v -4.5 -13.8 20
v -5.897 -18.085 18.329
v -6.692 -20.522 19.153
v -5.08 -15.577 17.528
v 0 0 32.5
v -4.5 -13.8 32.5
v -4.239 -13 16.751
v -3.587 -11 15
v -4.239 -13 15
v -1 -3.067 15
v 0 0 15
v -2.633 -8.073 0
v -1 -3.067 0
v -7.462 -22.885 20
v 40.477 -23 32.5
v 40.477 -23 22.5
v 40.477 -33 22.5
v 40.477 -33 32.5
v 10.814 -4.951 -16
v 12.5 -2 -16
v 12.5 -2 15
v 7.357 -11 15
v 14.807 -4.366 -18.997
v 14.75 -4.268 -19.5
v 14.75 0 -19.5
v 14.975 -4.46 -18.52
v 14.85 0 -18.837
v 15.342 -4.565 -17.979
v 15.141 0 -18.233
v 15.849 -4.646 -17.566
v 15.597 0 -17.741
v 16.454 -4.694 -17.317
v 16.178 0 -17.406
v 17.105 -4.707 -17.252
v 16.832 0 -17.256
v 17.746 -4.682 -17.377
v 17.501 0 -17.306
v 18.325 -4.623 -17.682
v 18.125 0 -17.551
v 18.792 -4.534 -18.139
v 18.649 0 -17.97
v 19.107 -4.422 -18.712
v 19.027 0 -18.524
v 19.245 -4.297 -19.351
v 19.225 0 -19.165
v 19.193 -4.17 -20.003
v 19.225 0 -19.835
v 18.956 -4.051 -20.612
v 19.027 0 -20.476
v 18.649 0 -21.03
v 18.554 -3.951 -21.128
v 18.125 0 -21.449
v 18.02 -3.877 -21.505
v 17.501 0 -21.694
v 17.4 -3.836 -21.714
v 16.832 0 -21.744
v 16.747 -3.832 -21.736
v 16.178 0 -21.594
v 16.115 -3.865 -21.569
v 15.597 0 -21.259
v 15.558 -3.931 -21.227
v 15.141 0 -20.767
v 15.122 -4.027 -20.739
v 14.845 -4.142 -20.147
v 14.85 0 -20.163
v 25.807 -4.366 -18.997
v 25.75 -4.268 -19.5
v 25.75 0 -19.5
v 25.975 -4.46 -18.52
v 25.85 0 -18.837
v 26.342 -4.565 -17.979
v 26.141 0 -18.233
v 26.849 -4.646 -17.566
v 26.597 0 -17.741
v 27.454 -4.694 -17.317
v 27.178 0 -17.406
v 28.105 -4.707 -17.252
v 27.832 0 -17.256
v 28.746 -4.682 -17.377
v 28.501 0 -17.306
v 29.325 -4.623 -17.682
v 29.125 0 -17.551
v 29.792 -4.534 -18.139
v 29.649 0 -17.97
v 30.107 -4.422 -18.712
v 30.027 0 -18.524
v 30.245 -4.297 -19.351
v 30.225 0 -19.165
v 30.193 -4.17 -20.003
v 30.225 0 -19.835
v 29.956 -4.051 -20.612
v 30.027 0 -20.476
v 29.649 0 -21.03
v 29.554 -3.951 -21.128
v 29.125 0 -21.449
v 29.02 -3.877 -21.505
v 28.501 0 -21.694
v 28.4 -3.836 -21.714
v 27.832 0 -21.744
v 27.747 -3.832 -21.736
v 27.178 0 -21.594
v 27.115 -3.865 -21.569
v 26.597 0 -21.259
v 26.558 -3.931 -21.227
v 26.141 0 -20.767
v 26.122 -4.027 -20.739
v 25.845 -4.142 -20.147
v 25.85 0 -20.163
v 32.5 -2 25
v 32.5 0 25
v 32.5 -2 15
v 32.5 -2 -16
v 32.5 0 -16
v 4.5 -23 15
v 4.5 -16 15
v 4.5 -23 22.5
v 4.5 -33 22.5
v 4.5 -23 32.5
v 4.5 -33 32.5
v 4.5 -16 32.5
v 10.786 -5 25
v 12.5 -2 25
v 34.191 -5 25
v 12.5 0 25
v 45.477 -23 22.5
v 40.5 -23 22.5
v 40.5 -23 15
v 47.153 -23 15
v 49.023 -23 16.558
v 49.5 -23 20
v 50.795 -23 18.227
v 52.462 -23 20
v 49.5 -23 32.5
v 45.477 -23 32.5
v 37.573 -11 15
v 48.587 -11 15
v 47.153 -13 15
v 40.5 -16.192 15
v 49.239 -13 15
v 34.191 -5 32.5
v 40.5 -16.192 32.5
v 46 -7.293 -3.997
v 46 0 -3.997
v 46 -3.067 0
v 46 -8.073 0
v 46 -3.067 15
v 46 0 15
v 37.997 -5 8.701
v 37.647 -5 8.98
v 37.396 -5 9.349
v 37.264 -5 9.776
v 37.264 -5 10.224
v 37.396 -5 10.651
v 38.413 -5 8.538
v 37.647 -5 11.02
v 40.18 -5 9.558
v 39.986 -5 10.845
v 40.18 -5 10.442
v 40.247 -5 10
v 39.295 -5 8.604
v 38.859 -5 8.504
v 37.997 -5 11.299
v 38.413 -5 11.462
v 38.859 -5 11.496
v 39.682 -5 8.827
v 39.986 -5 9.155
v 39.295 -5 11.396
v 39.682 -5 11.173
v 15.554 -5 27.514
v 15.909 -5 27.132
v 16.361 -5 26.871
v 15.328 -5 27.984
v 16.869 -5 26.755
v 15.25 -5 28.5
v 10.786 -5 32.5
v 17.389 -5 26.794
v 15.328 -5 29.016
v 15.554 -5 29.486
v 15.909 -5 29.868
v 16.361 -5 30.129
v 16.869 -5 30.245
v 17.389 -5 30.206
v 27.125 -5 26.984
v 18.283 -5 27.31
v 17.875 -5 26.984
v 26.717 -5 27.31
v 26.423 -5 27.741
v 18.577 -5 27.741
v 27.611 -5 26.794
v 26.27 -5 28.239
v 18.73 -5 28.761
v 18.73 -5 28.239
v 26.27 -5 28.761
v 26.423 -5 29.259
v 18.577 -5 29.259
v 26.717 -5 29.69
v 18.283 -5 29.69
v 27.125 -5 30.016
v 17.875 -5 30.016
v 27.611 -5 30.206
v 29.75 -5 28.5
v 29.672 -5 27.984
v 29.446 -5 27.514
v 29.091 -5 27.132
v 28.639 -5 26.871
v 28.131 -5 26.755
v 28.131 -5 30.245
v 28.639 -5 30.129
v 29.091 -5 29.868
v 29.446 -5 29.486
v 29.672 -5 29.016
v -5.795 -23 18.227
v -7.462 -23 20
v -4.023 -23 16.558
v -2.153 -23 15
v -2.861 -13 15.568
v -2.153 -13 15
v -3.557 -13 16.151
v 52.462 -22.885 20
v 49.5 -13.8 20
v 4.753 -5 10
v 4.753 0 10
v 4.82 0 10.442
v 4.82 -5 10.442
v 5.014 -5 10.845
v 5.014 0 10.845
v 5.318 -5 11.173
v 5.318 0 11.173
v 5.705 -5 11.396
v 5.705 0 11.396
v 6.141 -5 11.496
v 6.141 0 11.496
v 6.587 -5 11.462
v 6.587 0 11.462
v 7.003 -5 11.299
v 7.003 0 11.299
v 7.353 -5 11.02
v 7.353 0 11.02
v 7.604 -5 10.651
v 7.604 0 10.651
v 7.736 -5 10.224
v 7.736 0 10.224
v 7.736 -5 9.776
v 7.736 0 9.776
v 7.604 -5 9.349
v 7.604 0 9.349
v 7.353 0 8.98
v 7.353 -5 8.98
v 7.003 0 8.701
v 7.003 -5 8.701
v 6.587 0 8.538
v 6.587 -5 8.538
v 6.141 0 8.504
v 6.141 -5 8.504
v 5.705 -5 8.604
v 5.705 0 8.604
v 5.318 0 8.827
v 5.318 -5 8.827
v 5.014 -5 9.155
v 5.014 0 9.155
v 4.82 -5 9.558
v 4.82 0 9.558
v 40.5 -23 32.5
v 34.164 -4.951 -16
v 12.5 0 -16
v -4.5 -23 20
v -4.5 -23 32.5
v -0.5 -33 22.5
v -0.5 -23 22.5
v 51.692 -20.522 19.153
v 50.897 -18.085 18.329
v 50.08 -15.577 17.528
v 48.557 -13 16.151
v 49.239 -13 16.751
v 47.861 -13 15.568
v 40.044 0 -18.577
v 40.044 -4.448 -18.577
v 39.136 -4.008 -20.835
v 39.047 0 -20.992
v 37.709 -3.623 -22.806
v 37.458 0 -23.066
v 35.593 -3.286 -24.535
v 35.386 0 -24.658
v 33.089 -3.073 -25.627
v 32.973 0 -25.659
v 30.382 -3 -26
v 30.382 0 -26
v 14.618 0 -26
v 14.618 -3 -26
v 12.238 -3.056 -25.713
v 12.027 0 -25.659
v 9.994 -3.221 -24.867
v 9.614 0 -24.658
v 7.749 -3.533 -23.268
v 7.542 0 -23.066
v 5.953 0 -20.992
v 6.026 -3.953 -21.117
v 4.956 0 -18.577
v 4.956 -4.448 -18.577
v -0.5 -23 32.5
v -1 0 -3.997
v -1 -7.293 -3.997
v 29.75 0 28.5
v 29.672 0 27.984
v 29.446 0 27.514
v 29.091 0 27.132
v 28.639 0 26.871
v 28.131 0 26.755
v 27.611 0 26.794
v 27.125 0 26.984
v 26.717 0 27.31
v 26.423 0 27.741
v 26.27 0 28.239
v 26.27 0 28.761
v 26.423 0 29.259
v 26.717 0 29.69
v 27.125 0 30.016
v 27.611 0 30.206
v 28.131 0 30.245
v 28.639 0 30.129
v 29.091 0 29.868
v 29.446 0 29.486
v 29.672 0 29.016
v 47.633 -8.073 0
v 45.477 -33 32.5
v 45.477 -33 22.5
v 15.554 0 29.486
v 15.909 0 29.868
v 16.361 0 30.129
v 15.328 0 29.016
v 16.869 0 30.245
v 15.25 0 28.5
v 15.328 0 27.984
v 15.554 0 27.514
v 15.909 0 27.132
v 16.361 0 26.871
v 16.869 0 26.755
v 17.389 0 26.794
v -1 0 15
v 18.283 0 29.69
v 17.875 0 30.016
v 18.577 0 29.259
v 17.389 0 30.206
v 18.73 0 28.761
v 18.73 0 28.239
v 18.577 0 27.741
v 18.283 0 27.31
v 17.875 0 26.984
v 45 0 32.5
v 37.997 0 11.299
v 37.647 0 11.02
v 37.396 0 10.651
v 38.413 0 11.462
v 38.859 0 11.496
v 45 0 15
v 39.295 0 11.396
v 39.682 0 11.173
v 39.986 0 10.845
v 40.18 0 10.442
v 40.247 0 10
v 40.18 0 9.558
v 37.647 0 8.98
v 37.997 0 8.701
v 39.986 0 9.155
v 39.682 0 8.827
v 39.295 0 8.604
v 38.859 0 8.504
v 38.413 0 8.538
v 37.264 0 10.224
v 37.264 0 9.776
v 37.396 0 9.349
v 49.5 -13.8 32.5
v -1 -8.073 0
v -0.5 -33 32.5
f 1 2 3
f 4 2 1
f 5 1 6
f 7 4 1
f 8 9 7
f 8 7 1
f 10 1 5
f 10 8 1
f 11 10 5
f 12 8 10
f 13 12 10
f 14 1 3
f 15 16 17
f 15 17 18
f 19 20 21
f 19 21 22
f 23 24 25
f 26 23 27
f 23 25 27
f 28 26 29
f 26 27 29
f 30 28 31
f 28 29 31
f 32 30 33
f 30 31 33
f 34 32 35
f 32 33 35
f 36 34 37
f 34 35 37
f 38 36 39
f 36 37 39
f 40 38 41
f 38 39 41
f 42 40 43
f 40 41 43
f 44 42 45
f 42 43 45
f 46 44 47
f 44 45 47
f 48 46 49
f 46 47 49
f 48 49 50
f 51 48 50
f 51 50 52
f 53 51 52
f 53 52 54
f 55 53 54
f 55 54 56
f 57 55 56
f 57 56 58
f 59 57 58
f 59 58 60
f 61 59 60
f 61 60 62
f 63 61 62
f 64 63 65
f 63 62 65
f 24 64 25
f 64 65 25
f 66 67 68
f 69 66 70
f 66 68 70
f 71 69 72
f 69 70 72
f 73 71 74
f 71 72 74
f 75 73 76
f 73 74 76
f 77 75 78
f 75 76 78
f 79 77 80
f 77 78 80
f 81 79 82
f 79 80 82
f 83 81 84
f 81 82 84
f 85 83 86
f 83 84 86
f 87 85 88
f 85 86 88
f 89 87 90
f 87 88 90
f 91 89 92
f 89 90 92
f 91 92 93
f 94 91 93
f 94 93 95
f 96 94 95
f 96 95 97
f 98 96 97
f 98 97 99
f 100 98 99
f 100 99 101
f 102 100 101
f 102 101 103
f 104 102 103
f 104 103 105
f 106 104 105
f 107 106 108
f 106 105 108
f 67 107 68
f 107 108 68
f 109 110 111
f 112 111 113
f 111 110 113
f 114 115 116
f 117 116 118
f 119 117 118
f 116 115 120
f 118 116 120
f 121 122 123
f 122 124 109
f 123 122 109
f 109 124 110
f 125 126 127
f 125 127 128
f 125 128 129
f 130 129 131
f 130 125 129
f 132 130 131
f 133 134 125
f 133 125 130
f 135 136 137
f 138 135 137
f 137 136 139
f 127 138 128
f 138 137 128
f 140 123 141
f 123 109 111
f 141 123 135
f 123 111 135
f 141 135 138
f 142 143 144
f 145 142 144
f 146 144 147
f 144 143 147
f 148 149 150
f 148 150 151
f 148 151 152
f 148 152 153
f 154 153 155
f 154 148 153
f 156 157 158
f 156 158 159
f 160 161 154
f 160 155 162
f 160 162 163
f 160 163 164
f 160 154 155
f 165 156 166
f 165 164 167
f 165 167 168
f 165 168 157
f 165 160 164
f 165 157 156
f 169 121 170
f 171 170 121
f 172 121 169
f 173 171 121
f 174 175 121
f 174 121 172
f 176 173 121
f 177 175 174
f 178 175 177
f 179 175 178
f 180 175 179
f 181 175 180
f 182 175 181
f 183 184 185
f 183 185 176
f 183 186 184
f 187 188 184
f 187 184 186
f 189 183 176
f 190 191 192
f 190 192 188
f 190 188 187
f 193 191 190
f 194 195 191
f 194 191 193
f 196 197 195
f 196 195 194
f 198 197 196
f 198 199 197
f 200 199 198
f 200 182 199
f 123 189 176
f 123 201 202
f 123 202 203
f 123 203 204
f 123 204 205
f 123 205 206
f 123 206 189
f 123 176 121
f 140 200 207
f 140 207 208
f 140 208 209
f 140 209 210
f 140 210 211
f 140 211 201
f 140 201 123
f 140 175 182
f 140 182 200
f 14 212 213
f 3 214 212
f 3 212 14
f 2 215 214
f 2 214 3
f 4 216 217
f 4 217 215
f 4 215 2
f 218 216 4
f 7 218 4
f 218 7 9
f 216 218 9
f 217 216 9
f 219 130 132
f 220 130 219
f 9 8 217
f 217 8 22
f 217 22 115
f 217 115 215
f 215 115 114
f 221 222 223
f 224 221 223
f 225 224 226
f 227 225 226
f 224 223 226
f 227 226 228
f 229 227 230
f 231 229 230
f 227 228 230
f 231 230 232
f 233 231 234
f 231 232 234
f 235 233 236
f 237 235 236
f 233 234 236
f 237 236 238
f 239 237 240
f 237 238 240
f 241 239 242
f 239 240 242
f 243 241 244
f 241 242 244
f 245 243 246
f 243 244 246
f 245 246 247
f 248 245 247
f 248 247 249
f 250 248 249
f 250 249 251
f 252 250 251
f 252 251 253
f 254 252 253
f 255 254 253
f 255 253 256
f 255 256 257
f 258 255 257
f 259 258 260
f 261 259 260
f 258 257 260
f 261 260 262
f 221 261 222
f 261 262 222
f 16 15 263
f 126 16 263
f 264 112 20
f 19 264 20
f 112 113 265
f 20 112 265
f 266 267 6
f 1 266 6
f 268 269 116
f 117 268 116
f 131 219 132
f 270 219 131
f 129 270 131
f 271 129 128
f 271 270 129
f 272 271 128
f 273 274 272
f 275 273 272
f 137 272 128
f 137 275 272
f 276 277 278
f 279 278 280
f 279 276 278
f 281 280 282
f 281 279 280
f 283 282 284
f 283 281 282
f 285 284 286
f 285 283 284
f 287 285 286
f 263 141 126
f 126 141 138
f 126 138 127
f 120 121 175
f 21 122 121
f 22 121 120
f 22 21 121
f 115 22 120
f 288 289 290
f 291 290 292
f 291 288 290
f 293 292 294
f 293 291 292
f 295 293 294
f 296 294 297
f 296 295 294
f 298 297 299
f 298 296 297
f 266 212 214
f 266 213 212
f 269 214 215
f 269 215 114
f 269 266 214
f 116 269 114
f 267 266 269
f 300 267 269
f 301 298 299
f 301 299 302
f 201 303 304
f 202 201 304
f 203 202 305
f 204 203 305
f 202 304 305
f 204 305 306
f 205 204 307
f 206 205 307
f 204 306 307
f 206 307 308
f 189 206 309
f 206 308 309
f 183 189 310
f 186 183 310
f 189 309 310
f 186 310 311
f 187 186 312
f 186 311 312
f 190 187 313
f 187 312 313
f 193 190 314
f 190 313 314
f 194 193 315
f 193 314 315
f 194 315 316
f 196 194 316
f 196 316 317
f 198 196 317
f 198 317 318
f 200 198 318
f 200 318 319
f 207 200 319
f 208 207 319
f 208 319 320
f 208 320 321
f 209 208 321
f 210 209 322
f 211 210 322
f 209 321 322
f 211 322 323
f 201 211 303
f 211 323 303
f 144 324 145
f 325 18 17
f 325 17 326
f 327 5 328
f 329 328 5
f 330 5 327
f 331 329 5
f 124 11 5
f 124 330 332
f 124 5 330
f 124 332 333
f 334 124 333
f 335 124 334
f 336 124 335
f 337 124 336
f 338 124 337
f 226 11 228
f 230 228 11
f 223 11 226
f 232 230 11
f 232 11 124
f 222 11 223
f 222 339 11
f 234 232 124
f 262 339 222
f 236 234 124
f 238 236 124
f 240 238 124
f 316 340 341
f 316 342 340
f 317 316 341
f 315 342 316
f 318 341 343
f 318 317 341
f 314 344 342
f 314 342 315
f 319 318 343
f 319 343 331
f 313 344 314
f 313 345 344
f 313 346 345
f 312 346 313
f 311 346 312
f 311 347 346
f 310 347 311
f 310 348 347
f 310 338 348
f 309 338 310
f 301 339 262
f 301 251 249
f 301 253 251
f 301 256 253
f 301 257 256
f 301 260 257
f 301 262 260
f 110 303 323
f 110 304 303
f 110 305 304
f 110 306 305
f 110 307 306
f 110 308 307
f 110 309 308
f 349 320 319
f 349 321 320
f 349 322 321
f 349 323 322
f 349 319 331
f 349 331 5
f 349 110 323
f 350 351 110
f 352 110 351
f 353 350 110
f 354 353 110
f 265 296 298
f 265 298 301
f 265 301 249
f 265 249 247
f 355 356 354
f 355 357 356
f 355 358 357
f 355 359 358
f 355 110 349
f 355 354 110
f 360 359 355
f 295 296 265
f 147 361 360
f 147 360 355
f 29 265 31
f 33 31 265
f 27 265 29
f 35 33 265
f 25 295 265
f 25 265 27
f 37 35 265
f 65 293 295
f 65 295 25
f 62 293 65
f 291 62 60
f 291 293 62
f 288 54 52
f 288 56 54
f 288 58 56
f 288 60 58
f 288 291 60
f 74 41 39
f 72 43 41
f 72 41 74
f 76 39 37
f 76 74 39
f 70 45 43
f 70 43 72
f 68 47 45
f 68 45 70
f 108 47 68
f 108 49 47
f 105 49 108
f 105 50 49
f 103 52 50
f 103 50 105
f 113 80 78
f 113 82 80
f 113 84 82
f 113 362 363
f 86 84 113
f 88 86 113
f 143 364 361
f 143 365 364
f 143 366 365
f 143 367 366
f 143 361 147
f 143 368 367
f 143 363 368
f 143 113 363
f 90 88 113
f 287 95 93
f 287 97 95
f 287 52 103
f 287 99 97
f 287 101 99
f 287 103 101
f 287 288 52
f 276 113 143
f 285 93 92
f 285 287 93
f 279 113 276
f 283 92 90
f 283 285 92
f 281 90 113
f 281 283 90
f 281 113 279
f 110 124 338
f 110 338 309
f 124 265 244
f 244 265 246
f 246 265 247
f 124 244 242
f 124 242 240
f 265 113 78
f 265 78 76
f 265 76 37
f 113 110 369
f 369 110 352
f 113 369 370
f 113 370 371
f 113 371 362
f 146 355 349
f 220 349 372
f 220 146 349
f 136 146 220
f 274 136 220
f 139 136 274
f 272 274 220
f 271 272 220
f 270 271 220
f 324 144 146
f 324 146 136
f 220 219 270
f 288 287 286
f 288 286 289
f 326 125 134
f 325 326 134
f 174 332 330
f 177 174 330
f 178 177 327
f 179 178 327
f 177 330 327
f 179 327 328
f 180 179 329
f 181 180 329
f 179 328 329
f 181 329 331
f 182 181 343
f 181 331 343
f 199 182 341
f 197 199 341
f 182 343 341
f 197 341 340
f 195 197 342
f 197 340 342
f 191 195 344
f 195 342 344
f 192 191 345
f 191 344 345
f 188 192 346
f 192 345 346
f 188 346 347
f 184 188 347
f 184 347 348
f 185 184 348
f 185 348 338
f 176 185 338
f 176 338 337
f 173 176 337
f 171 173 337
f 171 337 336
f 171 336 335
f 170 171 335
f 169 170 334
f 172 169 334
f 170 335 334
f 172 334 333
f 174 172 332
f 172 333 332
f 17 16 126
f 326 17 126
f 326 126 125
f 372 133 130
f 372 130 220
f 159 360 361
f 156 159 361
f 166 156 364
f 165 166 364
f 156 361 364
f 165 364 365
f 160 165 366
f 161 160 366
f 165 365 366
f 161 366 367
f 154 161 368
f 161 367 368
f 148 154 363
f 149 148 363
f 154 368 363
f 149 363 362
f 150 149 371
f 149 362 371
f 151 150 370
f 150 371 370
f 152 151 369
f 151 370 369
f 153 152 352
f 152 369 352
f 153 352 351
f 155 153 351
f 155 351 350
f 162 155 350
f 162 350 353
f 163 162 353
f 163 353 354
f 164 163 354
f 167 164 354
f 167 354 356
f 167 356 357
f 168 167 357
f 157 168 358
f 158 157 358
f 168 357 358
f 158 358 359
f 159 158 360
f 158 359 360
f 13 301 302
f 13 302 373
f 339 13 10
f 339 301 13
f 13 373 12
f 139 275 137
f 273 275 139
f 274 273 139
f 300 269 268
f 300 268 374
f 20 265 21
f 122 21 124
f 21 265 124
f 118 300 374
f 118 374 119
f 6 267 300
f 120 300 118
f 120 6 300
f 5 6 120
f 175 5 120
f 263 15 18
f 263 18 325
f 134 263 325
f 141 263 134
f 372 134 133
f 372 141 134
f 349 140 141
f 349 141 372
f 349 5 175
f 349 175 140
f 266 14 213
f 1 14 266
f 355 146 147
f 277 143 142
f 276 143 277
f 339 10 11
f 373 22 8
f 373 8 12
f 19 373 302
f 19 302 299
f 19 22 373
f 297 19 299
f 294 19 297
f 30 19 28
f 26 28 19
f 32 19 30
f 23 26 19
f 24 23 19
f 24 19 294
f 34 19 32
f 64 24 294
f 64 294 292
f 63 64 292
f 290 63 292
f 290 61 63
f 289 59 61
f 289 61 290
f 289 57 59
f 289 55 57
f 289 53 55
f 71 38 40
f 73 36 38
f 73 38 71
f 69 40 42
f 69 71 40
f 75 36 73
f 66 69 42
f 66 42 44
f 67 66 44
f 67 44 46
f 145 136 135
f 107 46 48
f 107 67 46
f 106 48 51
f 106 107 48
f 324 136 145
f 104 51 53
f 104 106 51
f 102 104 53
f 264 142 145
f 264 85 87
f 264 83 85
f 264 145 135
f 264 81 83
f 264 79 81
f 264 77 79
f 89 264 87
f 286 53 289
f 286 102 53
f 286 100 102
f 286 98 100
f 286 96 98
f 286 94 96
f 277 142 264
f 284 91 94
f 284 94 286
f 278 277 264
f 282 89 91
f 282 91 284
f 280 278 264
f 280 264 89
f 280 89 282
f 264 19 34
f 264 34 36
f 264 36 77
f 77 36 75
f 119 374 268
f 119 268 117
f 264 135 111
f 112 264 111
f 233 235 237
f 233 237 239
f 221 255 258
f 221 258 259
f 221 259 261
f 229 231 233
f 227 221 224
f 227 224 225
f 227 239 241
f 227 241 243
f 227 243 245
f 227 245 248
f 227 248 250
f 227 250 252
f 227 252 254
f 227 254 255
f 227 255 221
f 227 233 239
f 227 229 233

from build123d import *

# Parameters (mm, degrees)
SALIENTE_EXTRUIR1_DEPTH  = 35
CROQUIS6_R               = 2.25
CROQUIS6_W               = 20
CROQUIS6_H               = 25
CORTAR_EXTRUIR3_DEPTH    = 10
CROQUIS7_R               = 2.25
SALIENTE_EXTRUIR4_DEPTH  = 15
CORTAR_EXTRUIR8_DEPTH    = 50
CORTAR_EXTRUIR11_REACH   = 69.158
CORTAR_EXTRUIR12_DEPTH   = 16
CROQUIS13_W              = 6.081292266
CROQUIS13_H              = 9.753773429
CORTAR_EXTRUIR13_DEPTH   = 15
CORTAR_EXTRUIR14_DEPTH   = 63.5
CORTAR_EXTRUIR15_DEPTH   = 100
SALIENTE_EXTRUIR5_REACH  = 69.158
CROQUIS16_W              = 15
CROQUIS16_H              = 10
CORTAR_EXTRUIR16_DEPTH   = 200
CORTAR_EXTRUIR17_DEPTH   = 200
SALIENTE_EXTRUIR7_DEPTH  = 23.5
CROQUIS22_R              = 2.25
CORTAR_EXTRUIR19_DEPTH   = 47
CORTAR_EXTRUIR20_DEPTH   = 31
CROQUIS24_W              = 29.420485752
CROQUIS24_H              = 5
SALIENTE_EXTRUIR9_DEPTH  = 10
CROQUIS25_R              = 1.75
CROQUIS25_R_2            = 1.5
CORTAR_EXTRUIR21_DEPTH   = 5
CROQUIS26_W              = 58.407198467
CROQUIS26_H              = 13.689988589
CORTAR_EXTRUIR22_DEPTH   = 73.871462178
CROQUIS27_W              = 5
CROQUIS27_H              = 10
SALIENTE_EXTRUIR10_DEPTH = 10
CORTAR_EXTRUIR23_START   = -10
CORTAR_EXTRUIR23_DEPTH   = 10


# Read off the part's stored shape, not the designer's step: Cortar-Extruir23
with BuildPart() as part:
    # Croquis1 → Saliente-Extruir1 (new body)
    with BuildSketch(Plane.XY):
        Polygon((0, 0), (45, 0), (52.5, -23), (40.5, -23), (40.5, -16.192411456), (32.5, -2), (12.5, -2), (4.5, -16), (4.5, -23), (-7.5, -23), align=None)
    extrude(amount=SALIENTE_EXTRUIR1_DEPTH)

    # Croquis6 → Cortar-Extruir3 (cut)
    with BuildSketch(Plane(origin=(0, 0, 0), x_dir=(1, 0, 0), z_dir=(0, 1, 0))):
        with Locations(Location((17, -28.5, 0), (0, 0, 180))):
            Circle(CROQUIS6_R)
        with Locations(Location((28, -28.5, 0), (0, 0, 270))):
            Circle(CROQUIS6_R)
        with Locations((22.5, -12.5)):
            Rectangle(CROQUIS6_W, CROQUIS6_H)
    extrude(amount=-CORTAR_EXTRUIR3_DEPTH, mode=Mode.SUBTRACT)

    # Cortar-Extruir11: up to this plane
    cortar_extruir11_end = Plane(origin=(50, -15, 0), z_dir=(0, -0.9079593845004518, -0.41905817746174695))
    # Croquis11 → Cortar-Extruir11 (cut, up to the surface)
    with BuildSketch(Plane.XZ.offset(23), mode=Mode.PRIVATE) as cortar_extruir11_sk1:
        with BuildLine():
            Line((-7.5, 15), (-7.5, -3.030649644))
            Line((-7.5, -3.030649644), (52.5, -3.030649644))
            Line((52.5, -3.030649644), (52.5, 15))
            ThreePointArc((52.5, 15), (22.5, 5.553378231), (-7.5, 15))
        make_face()
    cortar_extruir11_tool1 = split(extrude(cortar_extruir11_sk1.sketch, amount=-CORTAR_EXTRUIR11_REACH, mode=Mode.PRIVATE), bisect_by=cortar_extruir11_end, keep=Keep.BOTH, mode=Mode.PRIVATE)
    add(cortar_extruir11_tool1.solids().sort_by_distance((22.5, -23, 3.105508))[0], mode=Mode.SUBTRACT)

    # Croquis13 → Cortar-Extruir13 (cut)
    with BuildSketch(Plane.XY.offset(35)):
        with Locations((-7.540646133, -18.123113286)):
            Rectangle(CROQUIS13_W, CROQUIS13_H)
        with Locations((52.540646133, -18.123113286)):
            Rectangle(CROQUIS13_W, CROQUIS13_H)
    extrude(amount=-CORTAR_EXTRUIR13_DEPTH, mode=Mode.SUBTRACT)

    # Croquis14 → Cortar-Extruir14 (cut, symmetric)
    with BuildSketch(Plane(origin=(0, 0, 0), x_dir=(0, 0, -1), z_dir=(1, 0, 0))):
        Polygon((-15, -11), (-15, -28.858785619), (26, -23), (26, -3), align=None)
    extrude(amount=CORTAR_EXTRUIR14_DEPTH, both=True, mode=Mode.SUBTRACT)

    # Saliente-Extruir5: up to this face of the body (flat: up to its plane)
    saliente_extruir5_end = Plane(part.part.faces().sort_by_distance((6.25, 0, 0.570087713))[0])
    # Croquis16 → Saliente-Extruir5 (add, up to the picked face)
    with BuildSketch(Plane.XZ.offset(23), mode=Mode.PRIVATE) as saliente_extruir5_sk1:
        with Locations((5, 40)):
            Rectangle(CROQUIS16_W, CROQUIS16_H)
    saliente_extruir5_tool1 = split(extrude(saliente_extruir5_sk1.sketch, amount=-SALIENTE_EXTRUIR5_REACH, mode=Mode.PRIVATE), bisect_by=saliente_extruir5_end, keep=Keep.BOTH, mode=Mode.PRIVATE)
    # Croquis16 → Saliente-Extruir5 (add, up to the picked face)
    with BuildSketch(Plane.XZ.offset(23), mode=Mode.PRIVATE) as saliente_extruir5_sk2:
        with Locations((40, 40)):
            Rectangle(CROQUIS16_W, CROQUIS16_H)
    saliente_extruir5_tool2 = split(extrude(saliente_extruir5_sk2.sketch, amount=-SALIENTE_EXTRUIR5_REACH, mode=Mode.PRIVATE), bisect_by=saliente_extruir5_end, keep=Keep.BOTH, mode=Mode.PRIVATE)
    add(saliente_extruir5_tool1.solids().sort_by(Axis((5, -23, 40), (0, 1, 0)))[0])
    add(saliente_extruir5_tool2.solids().sort_by(Axis((40, -23, 40), (0, 1, 0)))[0])

    # Croquis17 → Cortar-Extruir16 (cut)
    with BuildSketch(Plane.ZY.offset(2.5)):
        Polygon((35, 0), (45, -23), (45, 0), align=None)
    extrude(amount=-CORTAR_EXTRUIR16_DEPTH, mode=Mode.SUBTRACT)

    # Croquis18 → Cortar-Extruir17 (cut)
    with BuildSketch(Plane(origin=(0, 0, 35), x_dir=(-1, 0, 0), z_dir=(0, 0, -1))):
        Polygon((-32.5, -2), (-40.5, -16.192411456), (-40.5, -23), (-32.5, -23), align=None)
        Polygon((-12.5, -23), (-4.5, -23), (-4.5, -16), (-12.5, -2), align=None)
        Polygon((-47.5, -7.666666667), (-45, 0), (-47.5, 0), align=None)
        Polygon((2.5, 0), (0, 0), (2.5, -7.666666667), align=None)
    extrude(amount=-CORTAR_EXTRUIR17_DEPTH, mode=Mode.SUBTRACT)



with BuildPart() as body_2:
    # Croquis7 → Saliente-Extruir4 (new body)
    with BuildSketch(Plane(origin=(0, 0, 0), x_dir=(1, 0, 0), z_dir=(0, 1, 0))):
        with BuildLine():
            Line((12.5, 16), (32.5, 16))
            Line((32.5, 16), (32.5, 0))
            Line((32.5, 0), (45, 0))
            Line((45, 0), (40.044296858, 18.577458823))
            ThreePointArc((40.044296858, 18.577458823), (36.474189304, 23.930150952), (30.382169451, 26))
            Line((30.382169451, 26), (14.617830549, 26))
            ThreePointArc((14.617830549, 26), (8.525810696, 23.930150952), (4.955703142, 18.577458823))
            Line((4.955703142, 18.577458823), (0, 0))
            Line((0, 0), (12.5, 0))
            Line((12.5, 0), (12.5, 16))
        make_face()
        with Locations((28, 19.5)):
            Circle(CROQUIS7_R, mode=Mode.SUBTRACT)
        with Locations((17, 19.5)):
            Circle(CROQUIS7_R, mode=Mode.SUBTRACT)
    extrude(amount=-SALIENTE_EXTRUIR4_DEPTH)

    # Croquis10 → Cortar-Extruir8 (cut)
    with BuildSketch(Plane(origin=(0, 0, 0), x_dir=(0, 0, -1), z_dir=(1, 0, 0))):
        Polygon((0, -15), (26, -3), (26, 0), (28.244981963, 0), (28.244981963, -21.856093693), align=None)
    extrude(amount=CORTAR_EXTRUIR8_DEPTH, mode=Mode.SUBTRACT)

    # Croquis12 → Cortar-Extruir12 (cut)
    with BuildSketch(Plane.XY):
        Polygon((12.5, -2), (12.5, -7.5), (12.5, -22.325980529), (0.885153984, -22.325980529), align=None)
        Polygon((44.114846016, -22.325980529), (32.5, -22.325980529), (32.5, -7.5), (32.5, -2), align=None)
    extrude(amount=-CORTAR_EXTRUIR12_DEPTH, mode=Mode.SUBTRACT)

    # Croquis15 → Cortar-Extruir15 (cut, symmetric)
    with BuildSketch(Plane(origin=(0, 0, 0), x_dir=(0, 0, -1), z_dir=(1, 0, 0))):
        Polygon((-15, -23), (-15, -11), (26, -3), align=None)
    extrude(amount=CORTAR_EXTRUIR15_DEPTH, both=True, mode=Mode.SUBTRACT)


with BuildPart() as part_1:
    add(part.part)

    add(body_2.part)  # Saliente-Extruir7 merges body 2
    # Croquis20 → Saliente-Extruir7 (add, symmetric)
    with BuildSketch(Plane(origin=(22.5, 0, 0), x_dir=(0, 0, -1), z_dir=(1, 0, 0))):
        Polygon((-15, -11), (-15, 0), (26, 0), (26, -3), align=None)
    extrude(amount=SALIENTE_EXTRUIR7_DEPTH, both=True)

    # Croquis22 → Cortar-Extruir19 (cut)
    with BuildSketch(Plane(origin=(0, 0, 0), x_dir=(1, 0, 0), z_dir=(0, 1, 0))):
        with Locations(Location((17, 19.5, 0), (0, 0, 180))):
            Circle(CROQUIS22_R)
        with Locations(Location((28, 19.5, 0), (0, 0, 180))):
            Circle(CROQUIS22_R)
        Polygon((12.5, 0), (12.5, -25), (32.5, -25), (32.5, 0), (32.5, 16), (12.5, 16), align=None)
        with BuildLine():
            Line((4.955703142, 18.577458823), (-2.632555673, 0))
            Line((-2.632555673, 0), (-11.688532454, 0))
            Line((-11.688532454, 0), (-11.688532454, 31.257495622))
            Line((-11.688532454, 31.257495622), (0, 31.257495622))
            Line((0, 31.257495622), (45, 31.257495622))
            Line((45, 31.257495622), (54.896993635, 31.257495622))
            Line((54.896993635, 31.257495622), (58.873924375, 0))
            Line((58.873924375, 0), (47.632555673, 0))
            Line((47.632555673, 0), (40.044296858, 18.577458823))
            ThreePointArc((40.044296858, 18.577458823), (36.474189304, 23.930150952), (30.382169451, 26))
            Line((30.382169451, 26), (14.617830549, 26))
            ThreePointArc((14.617830549, 26), (8.525810696, 23.930150952), (4.955703142, 18.577458823))
        make_face()
    extrude(amount=-CORTAR_EXTRUIR19_DEPTH, mode=Mode.SUBTRACT)

    # Croquis23 → Cortar-Extruir20 (cut)
    with BuildSketch(Plane.XY.offset(15)):
        Polygon((7.357142857, -11), (12.5, -11), (12.5, -2), align=None)
        Polygon((37.573133641, -11), (32.5, -2), (32.5, -11), align=None)
    extrude(amount=-CORTAR_EXTRUIR20_DEPTH, mode=Mode.SUBTRACT)

    # Croquis24 → Saliente-Extruir9 (add)
    with BuildSketch(Plane.XY.offset(35)):
        with Locations((22.884581513, -2.5)):
            Rectangle(CROQUIS24_W, CROQUIS24_H)
    extrude(amount=-SALIENTE_EXTRUIR9_DEPTH)

    # Croquis25 → Cortar-Extruir21 (cut)
    with BuildSketch(Plane(origin=(0, 0, 0), x_dir=(1, 0, 0), z_dir=(0, 1, 0))):
        with Locations(Location((17, -28.5, 0), (0, 0, 180))):
            Circle(CROQUIS25_R)
        with Locations((28, -28.5)):
            Circle(CROQUIS25_R)
        with Locations(Location((6.253029256, -10.000000184, 0), (0, 0, 180))):
            Circle(CROQUIS25_R_2)
        with Locations((38.746970744, -10.000000184)):
            Circle(CROQUIS25_R_2)
    extrude(amount=-CORTAR_EXTRUIR21_DEPTH, mode=Mode.SUBTRACT)

    # Croquis26 → Cortar-Extruir22 (cut, through all)
    with BuildSketch(Plane(origin=(0, 0, 0), x_dir=(1, 0, 0), z_dir=(0, 1, 0))):
        with Locations((24.703599234, -39.344994294)):
            Rectangle(CROQUIS26_W, CROQUIS26_H)
    extrude(amount=-CORTAR_EXTRUIR22_DEPTH, mode=Mode.SUBTRACT)

    # Croquis27 → Saliente-Extruir10 (add)
    with BuildSketch(Plane.XZ.offset(23)):
        with Locations((2, 27.5)):
            Rectangle(CROQUIS27_W, CROQUIS27_H)
        with Locations((42.976758833, 27.5)):
            Rectangle(CROQUIS27_W, CROQUIS27_H)
    extrude(amount=SALIENTE_EXTRUIR10_DEPTH)

    # Cortar-Extruir23 outline → Cortar-Extruir23 (cut)
    with BuildSketch(Plane.XZ.offset(23).offset(CORTAR_EXTRUIR23_START)):
        with BuildLine():
            ThreePointArc((-2.152586071, 15), (-4.921729811, 17.378723686), (-7.462476533, 20))
            Line((-7.462476533, 20), (-9, 21.738415502))
            Line((-9, 21.738415502), (-9, 15))
            Line((-9, 15), (-2.152586071, 15))
        make_face()
        with BuildLine():
            ThreePointArc((52.462476533, 20), (49.921729811, 17.378723686), (47.152586071, 15))
            Line((47.152586071, 15), (54, 15))
            Line((54, 15), (54, 21.738415502))
            Line((54, 21.738415502), (52.462476533, 20))
        make_face()
    extrude(amount=CORTAR_EXTRUIR23_DEPTH, mode=Mode.SUBTRACT)


solid = part_1.part
